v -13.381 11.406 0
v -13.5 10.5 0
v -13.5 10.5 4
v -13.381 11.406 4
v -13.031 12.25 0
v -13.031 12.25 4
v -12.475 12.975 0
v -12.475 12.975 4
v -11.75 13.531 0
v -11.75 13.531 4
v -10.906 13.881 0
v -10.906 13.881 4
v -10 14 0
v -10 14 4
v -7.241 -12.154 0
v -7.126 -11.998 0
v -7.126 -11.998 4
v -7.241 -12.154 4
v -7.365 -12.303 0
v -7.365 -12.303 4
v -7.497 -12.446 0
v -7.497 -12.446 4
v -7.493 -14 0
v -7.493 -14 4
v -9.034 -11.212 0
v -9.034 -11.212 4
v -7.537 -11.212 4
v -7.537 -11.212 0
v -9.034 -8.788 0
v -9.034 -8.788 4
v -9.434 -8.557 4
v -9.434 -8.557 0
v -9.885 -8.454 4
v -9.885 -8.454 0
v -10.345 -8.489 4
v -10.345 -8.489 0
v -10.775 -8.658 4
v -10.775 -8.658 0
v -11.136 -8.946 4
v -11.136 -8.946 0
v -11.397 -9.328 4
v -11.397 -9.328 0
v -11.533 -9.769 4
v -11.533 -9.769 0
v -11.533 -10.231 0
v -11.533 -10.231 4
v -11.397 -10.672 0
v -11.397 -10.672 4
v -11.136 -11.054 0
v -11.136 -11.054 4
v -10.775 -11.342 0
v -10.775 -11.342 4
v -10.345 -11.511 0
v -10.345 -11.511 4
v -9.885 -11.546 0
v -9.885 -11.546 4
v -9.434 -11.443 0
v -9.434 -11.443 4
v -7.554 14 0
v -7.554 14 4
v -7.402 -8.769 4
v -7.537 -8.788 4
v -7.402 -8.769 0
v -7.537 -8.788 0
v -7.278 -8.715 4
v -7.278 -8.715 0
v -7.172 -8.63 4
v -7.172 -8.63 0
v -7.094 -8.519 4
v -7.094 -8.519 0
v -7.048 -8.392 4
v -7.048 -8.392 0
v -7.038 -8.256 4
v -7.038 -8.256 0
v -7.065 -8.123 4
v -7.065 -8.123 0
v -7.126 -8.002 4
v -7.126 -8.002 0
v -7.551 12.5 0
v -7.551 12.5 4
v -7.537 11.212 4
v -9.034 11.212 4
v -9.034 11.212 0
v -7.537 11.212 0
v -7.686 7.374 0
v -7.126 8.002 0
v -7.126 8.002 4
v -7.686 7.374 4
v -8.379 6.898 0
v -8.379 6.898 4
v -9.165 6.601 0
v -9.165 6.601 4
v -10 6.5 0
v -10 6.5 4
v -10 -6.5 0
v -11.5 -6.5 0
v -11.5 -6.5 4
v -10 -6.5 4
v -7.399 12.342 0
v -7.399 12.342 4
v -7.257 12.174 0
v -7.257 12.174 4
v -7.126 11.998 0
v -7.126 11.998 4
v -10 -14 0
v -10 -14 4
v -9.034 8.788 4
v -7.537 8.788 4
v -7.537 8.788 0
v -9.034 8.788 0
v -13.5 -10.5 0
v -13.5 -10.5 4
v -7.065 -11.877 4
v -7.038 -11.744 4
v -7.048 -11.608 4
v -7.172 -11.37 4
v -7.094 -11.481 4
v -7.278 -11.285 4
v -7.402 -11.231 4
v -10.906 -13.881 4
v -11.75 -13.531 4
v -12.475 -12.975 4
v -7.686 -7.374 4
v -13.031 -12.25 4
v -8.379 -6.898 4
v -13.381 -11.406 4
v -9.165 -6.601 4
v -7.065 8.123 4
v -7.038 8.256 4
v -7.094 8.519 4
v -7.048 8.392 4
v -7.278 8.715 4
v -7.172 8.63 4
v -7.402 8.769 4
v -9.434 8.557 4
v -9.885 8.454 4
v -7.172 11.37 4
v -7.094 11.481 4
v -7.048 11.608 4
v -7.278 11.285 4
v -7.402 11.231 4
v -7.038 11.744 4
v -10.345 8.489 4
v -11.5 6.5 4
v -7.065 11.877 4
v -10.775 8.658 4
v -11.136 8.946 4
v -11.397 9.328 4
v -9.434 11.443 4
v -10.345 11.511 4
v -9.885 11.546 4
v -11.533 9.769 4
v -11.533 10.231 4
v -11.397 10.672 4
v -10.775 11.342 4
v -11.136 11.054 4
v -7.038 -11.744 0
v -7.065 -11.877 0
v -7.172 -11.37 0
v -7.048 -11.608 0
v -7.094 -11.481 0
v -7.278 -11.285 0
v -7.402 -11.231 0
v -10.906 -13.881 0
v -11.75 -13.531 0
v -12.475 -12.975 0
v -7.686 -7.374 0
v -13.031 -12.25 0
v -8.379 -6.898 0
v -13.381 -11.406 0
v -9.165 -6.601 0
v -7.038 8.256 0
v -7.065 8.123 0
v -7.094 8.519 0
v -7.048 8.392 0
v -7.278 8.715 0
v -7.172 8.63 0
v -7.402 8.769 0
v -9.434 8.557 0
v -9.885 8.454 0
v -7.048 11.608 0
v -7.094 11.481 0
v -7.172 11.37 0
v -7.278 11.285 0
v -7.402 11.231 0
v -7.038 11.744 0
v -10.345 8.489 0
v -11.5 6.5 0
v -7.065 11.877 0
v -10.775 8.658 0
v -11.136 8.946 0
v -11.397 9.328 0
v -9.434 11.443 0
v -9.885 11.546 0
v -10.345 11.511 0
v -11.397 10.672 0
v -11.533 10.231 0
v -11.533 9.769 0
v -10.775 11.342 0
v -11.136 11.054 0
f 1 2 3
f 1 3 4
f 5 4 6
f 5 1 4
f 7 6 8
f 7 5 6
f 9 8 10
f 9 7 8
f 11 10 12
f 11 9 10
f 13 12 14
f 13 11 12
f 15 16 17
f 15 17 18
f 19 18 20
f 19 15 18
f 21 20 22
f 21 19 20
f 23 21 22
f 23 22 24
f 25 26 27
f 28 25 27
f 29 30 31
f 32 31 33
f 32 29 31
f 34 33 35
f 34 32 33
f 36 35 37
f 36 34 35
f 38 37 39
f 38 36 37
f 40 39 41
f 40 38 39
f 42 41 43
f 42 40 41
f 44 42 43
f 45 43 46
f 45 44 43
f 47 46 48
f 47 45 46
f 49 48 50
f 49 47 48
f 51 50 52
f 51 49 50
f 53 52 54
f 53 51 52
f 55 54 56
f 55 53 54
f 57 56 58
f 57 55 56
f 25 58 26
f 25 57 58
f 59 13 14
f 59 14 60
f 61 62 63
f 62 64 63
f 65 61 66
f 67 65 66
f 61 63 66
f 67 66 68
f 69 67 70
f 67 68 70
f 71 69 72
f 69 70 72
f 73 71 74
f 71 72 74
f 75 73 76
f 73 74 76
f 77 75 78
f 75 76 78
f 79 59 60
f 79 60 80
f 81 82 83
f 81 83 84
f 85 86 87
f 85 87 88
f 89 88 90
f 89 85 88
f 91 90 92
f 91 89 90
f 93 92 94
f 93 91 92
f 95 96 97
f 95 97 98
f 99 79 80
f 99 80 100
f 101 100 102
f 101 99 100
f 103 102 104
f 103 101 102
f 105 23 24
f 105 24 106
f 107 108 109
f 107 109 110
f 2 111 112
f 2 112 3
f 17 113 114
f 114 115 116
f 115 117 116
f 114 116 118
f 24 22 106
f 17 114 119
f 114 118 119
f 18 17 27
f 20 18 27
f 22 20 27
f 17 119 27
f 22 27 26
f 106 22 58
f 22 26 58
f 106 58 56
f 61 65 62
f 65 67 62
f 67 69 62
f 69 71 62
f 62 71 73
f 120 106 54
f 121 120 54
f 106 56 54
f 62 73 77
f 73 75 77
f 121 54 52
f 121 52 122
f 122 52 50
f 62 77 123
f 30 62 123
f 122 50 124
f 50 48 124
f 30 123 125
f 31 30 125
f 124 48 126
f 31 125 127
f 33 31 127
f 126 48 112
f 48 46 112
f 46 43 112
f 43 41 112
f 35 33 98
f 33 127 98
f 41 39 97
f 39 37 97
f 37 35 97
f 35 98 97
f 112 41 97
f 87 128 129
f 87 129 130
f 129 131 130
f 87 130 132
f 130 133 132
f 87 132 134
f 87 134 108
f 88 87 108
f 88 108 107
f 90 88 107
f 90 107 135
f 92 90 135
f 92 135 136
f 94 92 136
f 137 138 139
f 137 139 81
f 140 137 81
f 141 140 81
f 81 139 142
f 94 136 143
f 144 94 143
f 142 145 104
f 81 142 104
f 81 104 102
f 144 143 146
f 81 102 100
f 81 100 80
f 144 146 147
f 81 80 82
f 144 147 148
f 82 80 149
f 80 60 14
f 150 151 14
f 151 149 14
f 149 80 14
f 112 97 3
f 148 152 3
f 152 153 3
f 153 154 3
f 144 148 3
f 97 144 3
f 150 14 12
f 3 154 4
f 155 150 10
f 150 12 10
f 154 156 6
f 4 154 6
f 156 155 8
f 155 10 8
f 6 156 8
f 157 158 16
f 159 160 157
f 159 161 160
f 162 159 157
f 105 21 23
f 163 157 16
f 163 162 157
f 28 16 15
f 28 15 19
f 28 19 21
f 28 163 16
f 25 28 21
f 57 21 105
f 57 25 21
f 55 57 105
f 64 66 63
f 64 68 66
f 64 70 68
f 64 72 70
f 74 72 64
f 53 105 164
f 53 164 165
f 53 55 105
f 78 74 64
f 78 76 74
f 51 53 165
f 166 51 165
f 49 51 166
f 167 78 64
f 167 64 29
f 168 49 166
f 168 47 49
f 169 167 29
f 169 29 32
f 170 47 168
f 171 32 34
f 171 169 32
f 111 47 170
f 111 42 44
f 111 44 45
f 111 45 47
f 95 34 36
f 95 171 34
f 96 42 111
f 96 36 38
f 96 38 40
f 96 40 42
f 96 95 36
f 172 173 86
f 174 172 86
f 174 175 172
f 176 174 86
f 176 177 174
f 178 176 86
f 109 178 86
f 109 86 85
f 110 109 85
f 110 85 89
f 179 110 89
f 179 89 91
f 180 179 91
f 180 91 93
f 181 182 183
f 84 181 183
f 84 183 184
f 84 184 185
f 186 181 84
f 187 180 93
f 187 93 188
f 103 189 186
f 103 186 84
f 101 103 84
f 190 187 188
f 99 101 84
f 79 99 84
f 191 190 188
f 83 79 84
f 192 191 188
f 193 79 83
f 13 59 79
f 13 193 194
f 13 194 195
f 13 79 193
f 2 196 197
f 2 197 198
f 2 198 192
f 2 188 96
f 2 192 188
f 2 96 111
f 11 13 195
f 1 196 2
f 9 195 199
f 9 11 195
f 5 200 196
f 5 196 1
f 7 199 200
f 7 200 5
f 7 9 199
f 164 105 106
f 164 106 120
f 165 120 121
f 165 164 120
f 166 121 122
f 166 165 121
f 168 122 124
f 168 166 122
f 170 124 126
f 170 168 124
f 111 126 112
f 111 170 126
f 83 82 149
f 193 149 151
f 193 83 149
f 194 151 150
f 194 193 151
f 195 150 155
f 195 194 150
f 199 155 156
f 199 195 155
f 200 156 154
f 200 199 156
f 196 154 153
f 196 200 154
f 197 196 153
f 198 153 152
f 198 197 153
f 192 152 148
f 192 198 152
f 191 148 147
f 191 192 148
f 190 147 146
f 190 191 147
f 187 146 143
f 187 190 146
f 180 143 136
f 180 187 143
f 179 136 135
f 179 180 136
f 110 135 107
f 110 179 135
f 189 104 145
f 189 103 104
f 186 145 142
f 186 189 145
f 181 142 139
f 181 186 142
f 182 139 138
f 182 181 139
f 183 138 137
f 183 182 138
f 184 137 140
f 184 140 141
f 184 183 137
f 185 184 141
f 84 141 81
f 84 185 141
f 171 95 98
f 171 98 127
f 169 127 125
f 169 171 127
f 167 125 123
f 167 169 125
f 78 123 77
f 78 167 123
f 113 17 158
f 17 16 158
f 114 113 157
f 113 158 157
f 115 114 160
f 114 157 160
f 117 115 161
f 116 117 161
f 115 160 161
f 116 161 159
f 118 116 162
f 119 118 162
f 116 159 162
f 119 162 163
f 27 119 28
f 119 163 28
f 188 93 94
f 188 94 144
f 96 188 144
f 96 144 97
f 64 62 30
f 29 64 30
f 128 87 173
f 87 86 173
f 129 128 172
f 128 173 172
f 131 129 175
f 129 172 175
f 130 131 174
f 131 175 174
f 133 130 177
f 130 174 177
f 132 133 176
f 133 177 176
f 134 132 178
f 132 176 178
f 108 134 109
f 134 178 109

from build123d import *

# Parameters (mm, degrees)
BOSS_EXTRUDE1_DEPTH = 4
CUT_EXTRUDE4_REACH  = 6
SKETCH2_R           = 1.55
CUT_EXTRUDE5_DEPTH  = 5
FILLET1_R           = 0.5


with BuildPart() as part:
    # Sketch1 → Boss-Extrude1 (new body)
    with BuildSketch(Plane.XY):
        with BuildLine():
            Line((-10, 14), (-7.553754025, 14))
            Line((-7.553754025, 14), (-7.550510257, 12.5))
            ThreePointArc((-7.550510257, 12.5), (-6.759629651, 8.677124344), (-10, 6.5))
            Line((-10, 6.5), (-11.5, 6.5))
            Line((-11.5, 6.5), (-11.5, -6.5))
            Line((-11.5, -6.5), (-10, -6.5))
            ThreePointArc((-10, -6.5), (-6.774250172, -8.641862287), (-7.496564289, -12.445978258))
            Line((-7.496564289, -12.445978258), (-7.493203699, -14))
            Line((-7.493203699, -14), (-10, -14))
            ThreePointArc((-10, -14), (-12.474873734, -12.974873734), (-13.5, -10.5))
            Line((-13.5, -10.5), (-13.5, 10.5))
            ThreePointArc((-13.5, 10.5), (-12.474873734, 12.974873734), (-10, 14))
        make_face()
    extrude(amount=BOSS_EXTRUDE1_DEPTH)

    # Sketch2 → Cut-Extrude4 (cut, up to next)
    with BuildSketch(Plane.XY, mode=Mode.PRIVATE) as cut_extrude4_sk1:
        with Locations((-10, -10)):
            Circle(SKETCH2_R)
    cut_extrude4_tool1 = extrude(cut_extrude4_sk1.sketch, amount=CUT_EXTRUDE4_REACH, mode=Mode.PRIVATE) & part.part
    add(cut_extrude4_tool1.solids().sort_by_distance((-10, -10, 0))[0], mode=Mode.SUBTRACT)
    # Sketch2 → Cut-Extrude4 (cut, up to next)
    with BuildSketch(Plane.XY, mode=Mode.PRIVATE) as cut_extrude4_sk2:
        with Locations((-10, 10)):
            Circle(SKETCH2_R)
    cut_extrude4_tool2 = extrude(cut_extrude4_sk2.sketch, amount=CUT_EXTRUDE4_REACH, mode=Mode.PRIVATE) & part.part
    add(cut_extrude4_tool2.solids().sort_by_distance((-10, 10, 0))[0], mode=Mode.SUBTRACT)

    # Sketch3 → Cut-Extrude5 (cut, through all)
    with BuildSketch(Plane.XY.offset(4)):
        with BuildLine():
            Line((-9.034256252, 11.212369174), (-6.716684452, 11.212369174))
            ThreePointArc((-6.716684452, 11.212369174), (-6.5, 10), (-6.716684452, 8.787630826))
            Line((-6.716684452, 8.787630826), (-9.034256252, 8.787630826))
            ThreePointArc((-9.034256252, 8.787630826), (-8.45, 10), (-9.034256252, 11.212369174))
        make_face()
    cut_extrude5 = extrude(amount=-CUT_EXTRUDE5_DEPTH, mode=Mode.SUBTRACT)

    # Mirror1: Cut-Extrude5 across plane
    add(cut_extrude5.mirror(Plane(origin=(0, 0, 0), x_dir=(0, 0, 1), z_dir=(0, -1, 0))), mode=Mode.SUBTRACT)

    # Fillet1
    fillet1_edges = [part.edges().sort_by_distance(p)[0] for p in [
        (-6.716684452, 11.212369174, 2),
        (-6.716684452, 8.787630826, 2),
        (-6.716684452, -8.787630826, 2),
        (-6.716684452, -11.212369174, 2),
    ]]
    fillet(fillet1_edges, radius=FILLET1_R)


solid = part.part
